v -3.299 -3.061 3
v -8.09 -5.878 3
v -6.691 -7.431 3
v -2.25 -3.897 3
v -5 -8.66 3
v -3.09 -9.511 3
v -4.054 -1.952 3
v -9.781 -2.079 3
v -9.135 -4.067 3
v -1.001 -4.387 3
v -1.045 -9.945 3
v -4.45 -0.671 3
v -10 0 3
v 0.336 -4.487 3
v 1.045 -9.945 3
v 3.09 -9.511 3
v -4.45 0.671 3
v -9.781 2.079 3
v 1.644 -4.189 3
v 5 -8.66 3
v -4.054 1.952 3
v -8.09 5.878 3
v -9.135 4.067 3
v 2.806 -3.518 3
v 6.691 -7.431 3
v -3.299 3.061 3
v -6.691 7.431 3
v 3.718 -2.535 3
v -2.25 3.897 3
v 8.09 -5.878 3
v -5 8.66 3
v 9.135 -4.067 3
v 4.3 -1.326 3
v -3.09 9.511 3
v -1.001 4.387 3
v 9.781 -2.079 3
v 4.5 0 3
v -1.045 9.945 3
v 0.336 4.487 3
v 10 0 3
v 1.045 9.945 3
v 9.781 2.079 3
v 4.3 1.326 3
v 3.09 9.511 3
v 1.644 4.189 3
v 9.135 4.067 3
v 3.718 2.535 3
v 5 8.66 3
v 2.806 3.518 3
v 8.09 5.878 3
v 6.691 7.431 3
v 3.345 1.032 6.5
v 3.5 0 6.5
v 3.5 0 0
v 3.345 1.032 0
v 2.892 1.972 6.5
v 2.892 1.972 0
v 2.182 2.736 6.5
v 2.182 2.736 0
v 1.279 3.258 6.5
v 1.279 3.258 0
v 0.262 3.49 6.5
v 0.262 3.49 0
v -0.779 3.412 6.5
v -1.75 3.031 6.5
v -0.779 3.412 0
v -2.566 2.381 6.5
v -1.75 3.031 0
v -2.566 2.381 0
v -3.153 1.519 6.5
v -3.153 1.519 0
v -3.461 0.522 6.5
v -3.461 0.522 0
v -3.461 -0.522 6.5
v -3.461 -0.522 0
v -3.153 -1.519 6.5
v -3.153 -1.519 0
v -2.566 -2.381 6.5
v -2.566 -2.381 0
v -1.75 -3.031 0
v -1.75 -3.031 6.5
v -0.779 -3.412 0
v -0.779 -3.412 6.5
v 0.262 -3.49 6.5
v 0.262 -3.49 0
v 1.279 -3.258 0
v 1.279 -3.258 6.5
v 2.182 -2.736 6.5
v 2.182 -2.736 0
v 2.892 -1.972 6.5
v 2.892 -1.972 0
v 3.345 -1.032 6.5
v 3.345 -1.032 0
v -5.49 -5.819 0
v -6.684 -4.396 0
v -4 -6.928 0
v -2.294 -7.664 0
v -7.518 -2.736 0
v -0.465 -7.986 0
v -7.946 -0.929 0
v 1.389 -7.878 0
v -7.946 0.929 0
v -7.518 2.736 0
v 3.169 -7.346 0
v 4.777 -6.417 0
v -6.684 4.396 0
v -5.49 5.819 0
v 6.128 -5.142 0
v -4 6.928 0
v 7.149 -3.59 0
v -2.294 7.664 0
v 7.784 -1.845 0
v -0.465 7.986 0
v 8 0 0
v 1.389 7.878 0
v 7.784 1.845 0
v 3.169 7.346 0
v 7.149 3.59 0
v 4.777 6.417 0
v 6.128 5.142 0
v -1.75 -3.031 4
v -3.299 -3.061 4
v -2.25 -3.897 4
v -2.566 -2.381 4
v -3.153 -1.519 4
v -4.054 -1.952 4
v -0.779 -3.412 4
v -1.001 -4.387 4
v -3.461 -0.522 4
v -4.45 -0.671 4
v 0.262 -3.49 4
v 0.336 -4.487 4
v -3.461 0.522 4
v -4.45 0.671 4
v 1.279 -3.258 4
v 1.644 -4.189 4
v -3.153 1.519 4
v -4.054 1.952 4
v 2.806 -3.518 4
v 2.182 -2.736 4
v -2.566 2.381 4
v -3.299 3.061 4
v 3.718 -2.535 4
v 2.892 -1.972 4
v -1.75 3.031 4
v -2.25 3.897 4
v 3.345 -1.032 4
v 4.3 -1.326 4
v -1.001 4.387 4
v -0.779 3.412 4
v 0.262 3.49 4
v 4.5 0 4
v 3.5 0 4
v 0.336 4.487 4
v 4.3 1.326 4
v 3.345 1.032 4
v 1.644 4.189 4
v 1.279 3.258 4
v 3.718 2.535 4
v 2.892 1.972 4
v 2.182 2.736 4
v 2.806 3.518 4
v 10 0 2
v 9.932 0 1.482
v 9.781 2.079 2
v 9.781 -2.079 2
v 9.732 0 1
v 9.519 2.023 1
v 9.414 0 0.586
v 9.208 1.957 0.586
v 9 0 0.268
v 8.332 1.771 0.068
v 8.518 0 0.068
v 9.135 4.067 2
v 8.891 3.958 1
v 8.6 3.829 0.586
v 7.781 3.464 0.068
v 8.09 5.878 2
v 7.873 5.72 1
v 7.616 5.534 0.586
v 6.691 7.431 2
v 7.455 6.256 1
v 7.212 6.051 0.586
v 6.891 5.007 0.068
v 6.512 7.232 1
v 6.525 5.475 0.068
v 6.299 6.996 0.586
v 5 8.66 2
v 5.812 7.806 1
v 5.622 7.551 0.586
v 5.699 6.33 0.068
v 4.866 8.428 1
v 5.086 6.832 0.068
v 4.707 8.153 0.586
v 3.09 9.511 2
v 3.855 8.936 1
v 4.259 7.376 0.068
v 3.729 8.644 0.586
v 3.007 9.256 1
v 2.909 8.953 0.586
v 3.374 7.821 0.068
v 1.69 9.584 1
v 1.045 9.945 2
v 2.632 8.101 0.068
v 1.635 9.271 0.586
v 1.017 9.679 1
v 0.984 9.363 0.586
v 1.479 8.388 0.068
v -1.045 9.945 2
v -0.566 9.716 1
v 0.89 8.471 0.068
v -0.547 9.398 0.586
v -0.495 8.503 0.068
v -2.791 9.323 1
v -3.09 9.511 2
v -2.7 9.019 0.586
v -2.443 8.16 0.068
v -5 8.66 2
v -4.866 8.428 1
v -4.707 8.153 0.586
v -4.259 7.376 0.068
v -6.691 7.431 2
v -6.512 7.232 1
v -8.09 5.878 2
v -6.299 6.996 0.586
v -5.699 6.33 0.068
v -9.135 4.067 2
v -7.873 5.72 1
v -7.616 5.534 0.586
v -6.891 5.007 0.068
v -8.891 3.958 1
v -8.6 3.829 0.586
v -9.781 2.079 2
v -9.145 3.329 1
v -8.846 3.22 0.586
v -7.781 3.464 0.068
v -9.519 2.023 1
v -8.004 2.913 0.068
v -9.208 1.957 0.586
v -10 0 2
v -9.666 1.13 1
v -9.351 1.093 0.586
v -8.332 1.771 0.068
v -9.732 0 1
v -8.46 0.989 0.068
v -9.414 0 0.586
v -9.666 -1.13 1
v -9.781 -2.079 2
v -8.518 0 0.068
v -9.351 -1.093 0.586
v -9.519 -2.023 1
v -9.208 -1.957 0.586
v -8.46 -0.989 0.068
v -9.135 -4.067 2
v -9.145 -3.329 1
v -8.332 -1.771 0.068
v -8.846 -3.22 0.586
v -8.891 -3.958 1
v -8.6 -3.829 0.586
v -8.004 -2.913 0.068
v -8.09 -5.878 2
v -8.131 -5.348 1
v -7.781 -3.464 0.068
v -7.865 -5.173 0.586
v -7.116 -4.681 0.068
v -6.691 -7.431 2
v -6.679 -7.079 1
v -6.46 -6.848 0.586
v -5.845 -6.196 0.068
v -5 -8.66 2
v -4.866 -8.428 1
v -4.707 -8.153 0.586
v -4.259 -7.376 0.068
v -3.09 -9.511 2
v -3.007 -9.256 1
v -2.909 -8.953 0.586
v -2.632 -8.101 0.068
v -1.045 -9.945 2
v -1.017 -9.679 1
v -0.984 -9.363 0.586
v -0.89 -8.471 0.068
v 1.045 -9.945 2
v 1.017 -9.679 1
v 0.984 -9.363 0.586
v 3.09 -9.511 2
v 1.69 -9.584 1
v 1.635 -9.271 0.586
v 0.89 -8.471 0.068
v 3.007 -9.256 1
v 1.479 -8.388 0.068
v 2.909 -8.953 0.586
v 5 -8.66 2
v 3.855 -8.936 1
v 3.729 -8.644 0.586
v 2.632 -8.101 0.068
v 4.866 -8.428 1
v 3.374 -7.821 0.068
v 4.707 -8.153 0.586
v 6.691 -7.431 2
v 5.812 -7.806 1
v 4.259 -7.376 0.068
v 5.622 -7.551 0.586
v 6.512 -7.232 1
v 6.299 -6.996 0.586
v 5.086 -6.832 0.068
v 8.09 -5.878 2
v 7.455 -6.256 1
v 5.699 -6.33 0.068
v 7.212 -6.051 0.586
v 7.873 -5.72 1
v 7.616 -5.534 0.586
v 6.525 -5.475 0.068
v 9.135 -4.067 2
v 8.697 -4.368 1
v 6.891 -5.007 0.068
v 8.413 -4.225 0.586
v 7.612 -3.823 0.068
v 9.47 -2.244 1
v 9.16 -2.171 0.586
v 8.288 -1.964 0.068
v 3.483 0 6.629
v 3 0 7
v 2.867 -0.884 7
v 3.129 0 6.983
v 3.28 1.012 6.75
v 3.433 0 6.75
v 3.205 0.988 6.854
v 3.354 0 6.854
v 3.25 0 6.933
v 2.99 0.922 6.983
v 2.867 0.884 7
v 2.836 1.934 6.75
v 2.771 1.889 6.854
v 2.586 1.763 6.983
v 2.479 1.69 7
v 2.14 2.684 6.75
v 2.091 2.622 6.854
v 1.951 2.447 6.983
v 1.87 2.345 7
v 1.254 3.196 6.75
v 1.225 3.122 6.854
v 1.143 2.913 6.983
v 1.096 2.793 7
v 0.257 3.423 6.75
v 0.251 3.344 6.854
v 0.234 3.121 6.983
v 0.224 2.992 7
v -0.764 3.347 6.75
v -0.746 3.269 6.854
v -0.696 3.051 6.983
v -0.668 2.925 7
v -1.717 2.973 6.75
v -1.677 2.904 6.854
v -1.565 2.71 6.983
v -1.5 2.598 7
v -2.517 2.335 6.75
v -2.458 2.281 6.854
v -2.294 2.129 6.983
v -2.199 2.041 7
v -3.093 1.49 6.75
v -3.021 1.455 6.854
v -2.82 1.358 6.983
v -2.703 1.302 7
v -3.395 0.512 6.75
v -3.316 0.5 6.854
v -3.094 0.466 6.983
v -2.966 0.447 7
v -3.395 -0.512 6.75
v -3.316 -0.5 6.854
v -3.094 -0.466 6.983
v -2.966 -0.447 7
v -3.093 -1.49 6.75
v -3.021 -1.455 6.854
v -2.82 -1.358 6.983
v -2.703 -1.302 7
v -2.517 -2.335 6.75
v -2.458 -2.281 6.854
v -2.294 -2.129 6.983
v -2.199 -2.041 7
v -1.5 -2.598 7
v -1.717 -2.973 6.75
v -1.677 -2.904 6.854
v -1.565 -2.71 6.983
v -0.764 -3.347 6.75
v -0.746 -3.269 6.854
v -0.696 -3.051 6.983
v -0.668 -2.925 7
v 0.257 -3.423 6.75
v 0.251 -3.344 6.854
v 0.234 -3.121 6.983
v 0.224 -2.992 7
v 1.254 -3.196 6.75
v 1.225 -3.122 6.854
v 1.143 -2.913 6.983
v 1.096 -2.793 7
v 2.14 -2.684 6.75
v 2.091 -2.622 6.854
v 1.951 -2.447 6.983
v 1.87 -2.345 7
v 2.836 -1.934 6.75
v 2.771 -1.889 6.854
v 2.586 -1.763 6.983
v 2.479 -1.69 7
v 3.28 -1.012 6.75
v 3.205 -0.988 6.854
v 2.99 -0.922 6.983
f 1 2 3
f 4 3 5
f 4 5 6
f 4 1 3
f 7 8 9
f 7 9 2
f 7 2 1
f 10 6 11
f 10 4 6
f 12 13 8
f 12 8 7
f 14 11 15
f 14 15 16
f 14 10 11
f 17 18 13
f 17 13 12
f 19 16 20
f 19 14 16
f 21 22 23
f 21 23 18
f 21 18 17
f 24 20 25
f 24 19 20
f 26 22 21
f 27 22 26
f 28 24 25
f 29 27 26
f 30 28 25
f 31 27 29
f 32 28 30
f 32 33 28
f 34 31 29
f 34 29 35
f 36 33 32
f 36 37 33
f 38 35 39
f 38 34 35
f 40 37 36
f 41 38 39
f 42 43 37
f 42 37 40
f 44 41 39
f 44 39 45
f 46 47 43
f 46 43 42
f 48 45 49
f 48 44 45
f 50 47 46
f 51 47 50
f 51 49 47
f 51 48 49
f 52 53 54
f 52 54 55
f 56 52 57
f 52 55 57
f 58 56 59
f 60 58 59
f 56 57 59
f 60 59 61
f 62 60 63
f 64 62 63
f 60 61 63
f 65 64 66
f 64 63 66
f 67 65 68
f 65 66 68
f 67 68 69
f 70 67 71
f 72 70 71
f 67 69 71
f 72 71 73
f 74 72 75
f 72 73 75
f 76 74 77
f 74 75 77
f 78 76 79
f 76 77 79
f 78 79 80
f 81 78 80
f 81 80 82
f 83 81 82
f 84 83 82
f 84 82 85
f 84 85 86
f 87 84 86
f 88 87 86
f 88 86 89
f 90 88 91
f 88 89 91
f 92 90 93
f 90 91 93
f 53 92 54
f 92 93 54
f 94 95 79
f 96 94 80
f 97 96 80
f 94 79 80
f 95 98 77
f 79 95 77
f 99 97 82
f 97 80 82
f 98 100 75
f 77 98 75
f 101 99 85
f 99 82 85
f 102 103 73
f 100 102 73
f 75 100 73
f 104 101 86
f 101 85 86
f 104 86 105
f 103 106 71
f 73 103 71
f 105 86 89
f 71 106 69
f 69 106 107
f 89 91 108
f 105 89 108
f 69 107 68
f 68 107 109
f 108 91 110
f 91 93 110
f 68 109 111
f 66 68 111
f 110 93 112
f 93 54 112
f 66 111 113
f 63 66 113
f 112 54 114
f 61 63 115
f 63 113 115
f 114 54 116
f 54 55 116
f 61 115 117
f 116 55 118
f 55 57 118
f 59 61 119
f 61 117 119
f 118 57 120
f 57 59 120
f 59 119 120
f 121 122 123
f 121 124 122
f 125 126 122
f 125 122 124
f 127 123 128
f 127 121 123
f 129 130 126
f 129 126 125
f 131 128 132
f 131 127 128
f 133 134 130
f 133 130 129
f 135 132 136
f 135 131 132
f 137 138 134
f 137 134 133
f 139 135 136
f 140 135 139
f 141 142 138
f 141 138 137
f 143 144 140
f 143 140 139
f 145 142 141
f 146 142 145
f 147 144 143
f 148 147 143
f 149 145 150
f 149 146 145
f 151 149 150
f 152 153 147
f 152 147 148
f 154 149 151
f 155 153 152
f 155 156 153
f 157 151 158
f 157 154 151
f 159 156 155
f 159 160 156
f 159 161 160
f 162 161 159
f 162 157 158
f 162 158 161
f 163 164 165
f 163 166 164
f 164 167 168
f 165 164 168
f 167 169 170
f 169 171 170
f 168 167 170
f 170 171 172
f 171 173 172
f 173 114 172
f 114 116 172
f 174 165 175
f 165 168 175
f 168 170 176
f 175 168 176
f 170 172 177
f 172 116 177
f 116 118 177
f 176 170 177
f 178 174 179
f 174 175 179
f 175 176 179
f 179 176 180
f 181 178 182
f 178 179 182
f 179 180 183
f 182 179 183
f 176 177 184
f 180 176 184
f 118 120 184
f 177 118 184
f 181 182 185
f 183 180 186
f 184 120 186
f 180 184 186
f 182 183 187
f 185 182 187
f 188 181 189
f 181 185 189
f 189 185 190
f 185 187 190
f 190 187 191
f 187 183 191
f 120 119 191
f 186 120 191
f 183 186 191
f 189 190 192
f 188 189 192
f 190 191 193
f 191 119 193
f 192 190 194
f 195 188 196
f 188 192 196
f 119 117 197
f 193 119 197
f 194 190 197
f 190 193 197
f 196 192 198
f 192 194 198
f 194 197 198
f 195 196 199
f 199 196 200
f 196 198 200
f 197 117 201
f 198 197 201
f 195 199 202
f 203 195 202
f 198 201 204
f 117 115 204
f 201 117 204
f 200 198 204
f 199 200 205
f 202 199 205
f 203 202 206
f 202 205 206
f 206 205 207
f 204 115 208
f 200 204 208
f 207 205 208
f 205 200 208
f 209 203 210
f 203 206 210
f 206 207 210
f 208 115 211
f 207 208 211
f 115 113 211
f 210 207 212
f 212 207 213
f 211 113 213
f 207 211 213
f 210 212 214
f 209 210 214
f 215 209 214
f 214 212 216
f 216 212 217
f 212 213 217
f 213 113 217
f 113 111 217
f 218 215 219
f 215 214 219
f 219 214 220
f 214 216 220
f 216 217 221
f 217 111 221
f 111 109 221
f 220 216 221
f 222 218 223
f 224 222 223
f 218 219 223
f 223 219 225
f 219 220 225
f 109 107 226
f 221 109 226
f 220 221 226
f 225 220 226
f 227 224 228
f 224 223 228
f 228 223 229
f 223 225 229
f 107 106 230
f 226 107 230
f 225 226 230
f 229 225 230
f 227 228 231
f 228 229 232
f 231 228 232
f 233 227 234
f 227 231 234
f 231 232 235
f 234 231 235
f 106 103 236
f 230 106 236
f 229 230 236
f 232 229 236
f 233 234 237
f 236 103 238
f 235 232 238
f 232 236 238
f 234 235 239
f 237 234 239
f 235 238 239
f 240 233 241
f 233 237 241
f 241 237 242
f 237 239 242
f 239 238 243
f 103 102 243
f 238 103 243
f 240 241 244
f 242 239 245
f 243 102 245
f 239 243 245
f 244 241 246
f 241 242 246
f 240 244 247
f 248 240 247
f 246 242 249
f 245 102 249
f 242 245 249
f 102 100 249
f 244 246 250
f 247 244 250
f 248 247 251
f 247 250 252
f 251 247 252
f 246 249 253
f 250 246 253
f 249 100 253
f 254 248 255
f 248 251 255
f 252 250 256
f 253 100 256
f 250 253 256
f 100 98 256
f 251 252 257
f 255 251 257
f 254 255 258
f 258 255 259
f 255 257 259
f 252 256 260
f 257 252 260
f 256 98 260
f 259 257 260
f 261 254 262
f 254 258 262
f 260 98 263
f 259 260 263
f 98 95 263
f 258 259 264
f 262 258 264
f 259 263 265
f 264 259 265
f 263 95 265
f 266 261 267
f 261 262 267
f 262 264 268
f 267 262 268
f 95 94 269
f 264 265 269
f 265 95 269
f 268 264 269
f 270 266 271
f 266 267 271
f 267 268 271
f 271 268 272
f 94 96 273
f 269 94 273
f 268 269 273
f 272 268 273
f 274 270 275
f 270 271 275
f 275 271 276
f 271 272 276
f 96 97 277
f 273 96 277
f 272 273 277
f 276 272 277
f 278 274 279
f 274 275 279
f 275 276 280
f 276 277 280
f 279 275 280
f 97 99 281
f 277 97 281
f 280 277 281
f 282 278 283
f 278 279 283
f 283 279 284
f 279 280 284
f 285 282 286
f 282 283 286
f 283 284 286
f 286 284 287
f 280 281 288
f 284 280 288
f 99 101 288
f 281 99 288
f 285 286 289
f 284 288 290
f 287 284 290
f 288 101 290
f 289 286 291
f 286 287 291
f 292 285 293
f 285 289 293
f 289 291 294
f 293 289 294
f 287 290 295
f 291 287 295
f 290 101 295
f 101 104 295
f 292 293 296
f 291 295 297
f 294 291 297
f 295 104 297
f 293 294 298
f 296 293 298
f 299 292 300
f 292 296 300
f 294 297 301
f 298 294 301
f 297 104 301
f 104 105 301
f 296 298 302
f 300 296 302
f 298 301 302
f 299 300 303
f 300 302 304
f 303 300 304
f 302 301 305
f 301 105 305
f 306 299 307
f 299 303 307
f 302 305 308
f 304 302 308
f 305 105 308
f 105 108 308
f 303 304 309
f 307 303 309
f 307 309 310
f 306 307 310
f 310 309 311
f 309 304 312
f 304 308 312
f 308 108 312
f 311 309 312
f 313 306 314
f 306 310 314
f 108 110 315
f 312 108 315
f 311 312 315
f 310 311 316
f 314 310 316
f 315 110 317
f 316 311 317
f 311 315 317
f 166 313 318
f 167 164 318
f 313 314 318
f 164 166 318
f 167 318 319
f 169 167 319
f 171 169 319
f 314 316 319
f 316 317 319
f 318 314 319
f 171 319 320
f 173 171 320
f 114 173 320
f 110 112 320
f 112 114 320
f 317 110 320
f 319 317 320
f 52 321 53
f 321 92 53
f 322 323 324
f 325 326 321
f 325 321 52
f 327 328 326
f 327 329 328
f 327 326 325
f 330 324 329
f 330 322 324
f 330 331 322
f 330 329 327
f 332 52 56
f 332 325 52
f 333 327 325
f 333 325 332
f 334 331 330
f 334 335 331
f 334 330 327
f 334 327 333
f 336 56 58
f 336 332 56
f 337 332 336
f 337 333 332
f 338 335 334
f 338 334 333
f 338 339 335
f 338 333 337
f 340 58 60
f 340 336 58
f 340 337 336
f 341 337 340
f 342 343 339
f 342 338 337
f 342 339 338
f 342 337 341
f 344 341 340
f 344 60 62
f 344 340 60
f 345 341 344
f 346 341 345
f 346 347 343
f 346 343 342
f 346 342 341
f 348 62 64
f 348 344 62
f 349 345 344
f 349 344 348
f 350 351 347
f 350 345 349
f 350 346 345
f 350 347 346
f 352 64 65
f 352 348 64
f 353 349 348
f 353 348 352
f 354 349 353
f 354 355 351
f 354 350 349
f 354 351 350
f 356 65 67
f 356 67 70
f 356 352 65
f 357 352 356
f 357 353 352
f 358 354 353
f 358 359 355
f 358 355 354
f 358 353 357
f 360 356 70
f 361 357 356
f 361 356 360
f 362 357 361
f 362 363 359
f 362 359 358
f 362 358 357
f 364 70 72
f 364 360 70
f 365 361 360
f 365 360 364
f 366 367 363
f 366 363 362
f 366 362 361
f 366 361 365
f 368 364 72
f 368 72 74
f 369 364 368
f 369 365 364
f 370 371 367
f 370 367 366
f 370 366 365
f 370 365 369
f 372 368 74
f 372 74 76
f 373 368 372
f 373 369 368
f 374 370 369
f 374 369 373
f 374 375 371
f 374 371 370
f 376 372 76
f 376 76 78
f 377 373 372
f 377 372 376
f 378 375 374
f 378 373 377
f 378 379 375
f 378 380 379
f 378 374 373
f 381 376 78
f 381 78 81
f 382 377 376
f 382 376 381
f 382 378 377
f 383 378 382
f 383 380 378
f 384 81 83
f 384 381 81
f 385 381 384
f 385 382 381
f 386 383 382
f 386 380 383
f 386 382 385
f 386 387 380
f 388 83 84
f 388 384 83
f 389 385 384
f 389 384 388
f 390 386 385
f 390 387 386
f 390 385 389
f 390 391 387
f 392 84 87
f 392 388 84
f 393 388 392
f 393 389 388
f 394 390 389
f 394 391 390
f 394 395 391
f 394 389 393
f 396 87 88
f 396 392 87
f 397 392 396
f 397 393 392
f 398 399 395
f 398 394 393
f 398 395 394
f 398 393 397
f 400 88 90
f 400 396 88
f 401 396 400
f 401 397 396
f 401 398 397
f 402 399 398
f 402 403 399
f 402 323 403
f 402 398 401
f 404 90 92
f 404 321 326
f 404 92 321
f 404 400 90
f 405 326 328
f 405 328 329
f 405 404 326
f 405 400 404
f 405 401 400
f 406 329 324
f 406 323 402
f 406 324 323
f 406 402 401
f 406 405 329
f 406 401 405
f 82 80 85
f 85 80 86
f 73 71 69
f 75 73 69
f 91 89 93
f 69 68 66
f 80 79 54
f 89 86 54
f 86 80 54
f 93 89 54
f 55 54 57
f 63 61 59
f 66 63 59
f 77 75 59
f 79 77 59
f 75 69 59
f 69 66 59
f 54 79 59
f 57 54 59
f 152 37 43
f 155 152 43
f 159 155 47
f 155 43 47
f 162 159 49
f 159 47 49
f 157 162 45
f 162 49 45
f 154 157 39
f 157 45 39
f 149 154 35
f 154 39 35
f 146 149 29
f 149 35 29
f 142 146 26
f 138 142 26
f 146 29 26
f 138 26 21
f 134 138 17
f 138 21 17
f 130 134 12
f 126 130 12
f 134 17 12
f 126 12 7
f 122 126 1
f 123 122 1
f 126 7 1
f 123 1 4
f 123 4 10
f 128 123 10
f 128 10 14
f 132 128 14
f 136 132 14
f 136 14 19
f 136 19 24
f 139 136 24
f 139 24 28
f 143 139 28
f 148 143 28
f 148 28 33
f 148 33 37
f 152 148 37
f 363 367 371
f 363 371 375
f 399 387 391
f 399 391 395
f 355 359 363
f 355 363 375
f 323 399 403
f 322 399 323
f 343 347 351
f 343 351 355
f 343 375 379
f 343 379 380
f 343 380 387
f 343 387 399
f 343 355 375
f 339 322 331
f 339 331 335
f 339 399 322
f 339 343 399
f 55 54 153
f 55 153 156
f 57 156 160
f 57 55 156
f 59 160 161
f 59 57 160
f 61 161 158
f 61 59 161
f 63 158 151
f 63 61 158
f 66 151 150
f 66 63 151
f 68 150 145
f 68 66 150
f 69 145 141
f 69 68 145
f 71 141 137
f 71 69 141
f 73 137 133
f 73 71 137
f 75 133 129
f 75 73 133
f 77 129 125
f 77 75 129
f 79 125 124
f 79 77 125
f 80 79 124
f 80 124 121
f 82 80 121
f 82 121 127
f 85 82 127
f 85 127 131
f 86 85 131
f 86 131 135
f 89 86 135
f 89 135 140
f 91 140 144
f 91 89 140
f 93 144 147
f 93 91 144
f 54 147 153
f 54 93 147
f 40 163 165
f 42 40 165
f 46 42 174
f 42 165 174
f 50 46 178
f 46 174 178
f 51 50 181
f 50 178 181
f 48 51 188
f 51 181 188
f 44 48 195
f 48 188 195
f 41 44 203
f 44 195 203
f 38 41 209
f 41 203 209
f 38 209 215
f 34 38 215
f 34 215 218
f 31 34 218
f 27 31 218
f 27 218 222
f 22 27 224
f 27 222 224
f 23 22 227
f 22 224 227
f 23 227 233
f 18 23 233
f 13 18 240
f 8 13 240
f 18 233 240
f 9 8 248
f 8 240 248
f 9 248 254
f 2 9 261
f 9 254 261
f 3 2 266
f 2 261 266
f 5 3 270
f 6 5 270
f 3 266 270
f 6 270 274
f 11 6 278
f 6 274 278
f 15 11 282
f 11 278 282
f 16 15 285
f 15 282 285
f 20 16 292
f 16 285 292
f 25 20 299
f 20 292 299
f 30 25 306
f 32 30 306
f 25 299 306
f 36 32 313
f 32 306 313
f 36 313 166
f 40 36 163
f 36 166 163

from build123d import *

# Parameters (mm, degrees)
F0_R     = 3.5
F1_DEPTH = 7
F0_R_2   = 4.5
F2_DEPTH = 4
F0_R_3   = 10
F3_DEPTH = 3
F4_R     = 2
F5_R     = 0.5


with BuildPart() as f1:
    # F0 (on Top) → F1 (new body)
    with BuildSketch(Plane.XY):
        Circle(F0_R)
    extrude(amount=F1_DEPTH)

    # F5
    f5_edges = [f1.edges().sort_by_distance(p)[0] for p in [
        (-3.5, 0, 7),
    ]]
    fillet(f5_edges, radius=F5_R)


with BuildPart() as f2:
    # F0 (on Top) → F2 (new body)
    with BuildSketch(Plane.XY):
        Circle(F0_R_2)
        Circle(F0_R, mode=Mode.SUBTRACT)
    extrude(amount=F2_DEPTH)

    # F0 (on Top) → F3 (join)
    with BuildSketch(Plane.XY):
        Circle(F0_R_3)
        Circle(F0_R_2, mode=Mode.SUBTRACT)
    extrude(amount=F3_DEPTH)

    # F4
    f4_edges = [f2.edges().sort_by_distance(p)[0] for p in [
        (-10, 0, 0),
    ]]
    fillet(f4_edges, radius=F4_R)


solid = Compound([f1.part, f2.part])
